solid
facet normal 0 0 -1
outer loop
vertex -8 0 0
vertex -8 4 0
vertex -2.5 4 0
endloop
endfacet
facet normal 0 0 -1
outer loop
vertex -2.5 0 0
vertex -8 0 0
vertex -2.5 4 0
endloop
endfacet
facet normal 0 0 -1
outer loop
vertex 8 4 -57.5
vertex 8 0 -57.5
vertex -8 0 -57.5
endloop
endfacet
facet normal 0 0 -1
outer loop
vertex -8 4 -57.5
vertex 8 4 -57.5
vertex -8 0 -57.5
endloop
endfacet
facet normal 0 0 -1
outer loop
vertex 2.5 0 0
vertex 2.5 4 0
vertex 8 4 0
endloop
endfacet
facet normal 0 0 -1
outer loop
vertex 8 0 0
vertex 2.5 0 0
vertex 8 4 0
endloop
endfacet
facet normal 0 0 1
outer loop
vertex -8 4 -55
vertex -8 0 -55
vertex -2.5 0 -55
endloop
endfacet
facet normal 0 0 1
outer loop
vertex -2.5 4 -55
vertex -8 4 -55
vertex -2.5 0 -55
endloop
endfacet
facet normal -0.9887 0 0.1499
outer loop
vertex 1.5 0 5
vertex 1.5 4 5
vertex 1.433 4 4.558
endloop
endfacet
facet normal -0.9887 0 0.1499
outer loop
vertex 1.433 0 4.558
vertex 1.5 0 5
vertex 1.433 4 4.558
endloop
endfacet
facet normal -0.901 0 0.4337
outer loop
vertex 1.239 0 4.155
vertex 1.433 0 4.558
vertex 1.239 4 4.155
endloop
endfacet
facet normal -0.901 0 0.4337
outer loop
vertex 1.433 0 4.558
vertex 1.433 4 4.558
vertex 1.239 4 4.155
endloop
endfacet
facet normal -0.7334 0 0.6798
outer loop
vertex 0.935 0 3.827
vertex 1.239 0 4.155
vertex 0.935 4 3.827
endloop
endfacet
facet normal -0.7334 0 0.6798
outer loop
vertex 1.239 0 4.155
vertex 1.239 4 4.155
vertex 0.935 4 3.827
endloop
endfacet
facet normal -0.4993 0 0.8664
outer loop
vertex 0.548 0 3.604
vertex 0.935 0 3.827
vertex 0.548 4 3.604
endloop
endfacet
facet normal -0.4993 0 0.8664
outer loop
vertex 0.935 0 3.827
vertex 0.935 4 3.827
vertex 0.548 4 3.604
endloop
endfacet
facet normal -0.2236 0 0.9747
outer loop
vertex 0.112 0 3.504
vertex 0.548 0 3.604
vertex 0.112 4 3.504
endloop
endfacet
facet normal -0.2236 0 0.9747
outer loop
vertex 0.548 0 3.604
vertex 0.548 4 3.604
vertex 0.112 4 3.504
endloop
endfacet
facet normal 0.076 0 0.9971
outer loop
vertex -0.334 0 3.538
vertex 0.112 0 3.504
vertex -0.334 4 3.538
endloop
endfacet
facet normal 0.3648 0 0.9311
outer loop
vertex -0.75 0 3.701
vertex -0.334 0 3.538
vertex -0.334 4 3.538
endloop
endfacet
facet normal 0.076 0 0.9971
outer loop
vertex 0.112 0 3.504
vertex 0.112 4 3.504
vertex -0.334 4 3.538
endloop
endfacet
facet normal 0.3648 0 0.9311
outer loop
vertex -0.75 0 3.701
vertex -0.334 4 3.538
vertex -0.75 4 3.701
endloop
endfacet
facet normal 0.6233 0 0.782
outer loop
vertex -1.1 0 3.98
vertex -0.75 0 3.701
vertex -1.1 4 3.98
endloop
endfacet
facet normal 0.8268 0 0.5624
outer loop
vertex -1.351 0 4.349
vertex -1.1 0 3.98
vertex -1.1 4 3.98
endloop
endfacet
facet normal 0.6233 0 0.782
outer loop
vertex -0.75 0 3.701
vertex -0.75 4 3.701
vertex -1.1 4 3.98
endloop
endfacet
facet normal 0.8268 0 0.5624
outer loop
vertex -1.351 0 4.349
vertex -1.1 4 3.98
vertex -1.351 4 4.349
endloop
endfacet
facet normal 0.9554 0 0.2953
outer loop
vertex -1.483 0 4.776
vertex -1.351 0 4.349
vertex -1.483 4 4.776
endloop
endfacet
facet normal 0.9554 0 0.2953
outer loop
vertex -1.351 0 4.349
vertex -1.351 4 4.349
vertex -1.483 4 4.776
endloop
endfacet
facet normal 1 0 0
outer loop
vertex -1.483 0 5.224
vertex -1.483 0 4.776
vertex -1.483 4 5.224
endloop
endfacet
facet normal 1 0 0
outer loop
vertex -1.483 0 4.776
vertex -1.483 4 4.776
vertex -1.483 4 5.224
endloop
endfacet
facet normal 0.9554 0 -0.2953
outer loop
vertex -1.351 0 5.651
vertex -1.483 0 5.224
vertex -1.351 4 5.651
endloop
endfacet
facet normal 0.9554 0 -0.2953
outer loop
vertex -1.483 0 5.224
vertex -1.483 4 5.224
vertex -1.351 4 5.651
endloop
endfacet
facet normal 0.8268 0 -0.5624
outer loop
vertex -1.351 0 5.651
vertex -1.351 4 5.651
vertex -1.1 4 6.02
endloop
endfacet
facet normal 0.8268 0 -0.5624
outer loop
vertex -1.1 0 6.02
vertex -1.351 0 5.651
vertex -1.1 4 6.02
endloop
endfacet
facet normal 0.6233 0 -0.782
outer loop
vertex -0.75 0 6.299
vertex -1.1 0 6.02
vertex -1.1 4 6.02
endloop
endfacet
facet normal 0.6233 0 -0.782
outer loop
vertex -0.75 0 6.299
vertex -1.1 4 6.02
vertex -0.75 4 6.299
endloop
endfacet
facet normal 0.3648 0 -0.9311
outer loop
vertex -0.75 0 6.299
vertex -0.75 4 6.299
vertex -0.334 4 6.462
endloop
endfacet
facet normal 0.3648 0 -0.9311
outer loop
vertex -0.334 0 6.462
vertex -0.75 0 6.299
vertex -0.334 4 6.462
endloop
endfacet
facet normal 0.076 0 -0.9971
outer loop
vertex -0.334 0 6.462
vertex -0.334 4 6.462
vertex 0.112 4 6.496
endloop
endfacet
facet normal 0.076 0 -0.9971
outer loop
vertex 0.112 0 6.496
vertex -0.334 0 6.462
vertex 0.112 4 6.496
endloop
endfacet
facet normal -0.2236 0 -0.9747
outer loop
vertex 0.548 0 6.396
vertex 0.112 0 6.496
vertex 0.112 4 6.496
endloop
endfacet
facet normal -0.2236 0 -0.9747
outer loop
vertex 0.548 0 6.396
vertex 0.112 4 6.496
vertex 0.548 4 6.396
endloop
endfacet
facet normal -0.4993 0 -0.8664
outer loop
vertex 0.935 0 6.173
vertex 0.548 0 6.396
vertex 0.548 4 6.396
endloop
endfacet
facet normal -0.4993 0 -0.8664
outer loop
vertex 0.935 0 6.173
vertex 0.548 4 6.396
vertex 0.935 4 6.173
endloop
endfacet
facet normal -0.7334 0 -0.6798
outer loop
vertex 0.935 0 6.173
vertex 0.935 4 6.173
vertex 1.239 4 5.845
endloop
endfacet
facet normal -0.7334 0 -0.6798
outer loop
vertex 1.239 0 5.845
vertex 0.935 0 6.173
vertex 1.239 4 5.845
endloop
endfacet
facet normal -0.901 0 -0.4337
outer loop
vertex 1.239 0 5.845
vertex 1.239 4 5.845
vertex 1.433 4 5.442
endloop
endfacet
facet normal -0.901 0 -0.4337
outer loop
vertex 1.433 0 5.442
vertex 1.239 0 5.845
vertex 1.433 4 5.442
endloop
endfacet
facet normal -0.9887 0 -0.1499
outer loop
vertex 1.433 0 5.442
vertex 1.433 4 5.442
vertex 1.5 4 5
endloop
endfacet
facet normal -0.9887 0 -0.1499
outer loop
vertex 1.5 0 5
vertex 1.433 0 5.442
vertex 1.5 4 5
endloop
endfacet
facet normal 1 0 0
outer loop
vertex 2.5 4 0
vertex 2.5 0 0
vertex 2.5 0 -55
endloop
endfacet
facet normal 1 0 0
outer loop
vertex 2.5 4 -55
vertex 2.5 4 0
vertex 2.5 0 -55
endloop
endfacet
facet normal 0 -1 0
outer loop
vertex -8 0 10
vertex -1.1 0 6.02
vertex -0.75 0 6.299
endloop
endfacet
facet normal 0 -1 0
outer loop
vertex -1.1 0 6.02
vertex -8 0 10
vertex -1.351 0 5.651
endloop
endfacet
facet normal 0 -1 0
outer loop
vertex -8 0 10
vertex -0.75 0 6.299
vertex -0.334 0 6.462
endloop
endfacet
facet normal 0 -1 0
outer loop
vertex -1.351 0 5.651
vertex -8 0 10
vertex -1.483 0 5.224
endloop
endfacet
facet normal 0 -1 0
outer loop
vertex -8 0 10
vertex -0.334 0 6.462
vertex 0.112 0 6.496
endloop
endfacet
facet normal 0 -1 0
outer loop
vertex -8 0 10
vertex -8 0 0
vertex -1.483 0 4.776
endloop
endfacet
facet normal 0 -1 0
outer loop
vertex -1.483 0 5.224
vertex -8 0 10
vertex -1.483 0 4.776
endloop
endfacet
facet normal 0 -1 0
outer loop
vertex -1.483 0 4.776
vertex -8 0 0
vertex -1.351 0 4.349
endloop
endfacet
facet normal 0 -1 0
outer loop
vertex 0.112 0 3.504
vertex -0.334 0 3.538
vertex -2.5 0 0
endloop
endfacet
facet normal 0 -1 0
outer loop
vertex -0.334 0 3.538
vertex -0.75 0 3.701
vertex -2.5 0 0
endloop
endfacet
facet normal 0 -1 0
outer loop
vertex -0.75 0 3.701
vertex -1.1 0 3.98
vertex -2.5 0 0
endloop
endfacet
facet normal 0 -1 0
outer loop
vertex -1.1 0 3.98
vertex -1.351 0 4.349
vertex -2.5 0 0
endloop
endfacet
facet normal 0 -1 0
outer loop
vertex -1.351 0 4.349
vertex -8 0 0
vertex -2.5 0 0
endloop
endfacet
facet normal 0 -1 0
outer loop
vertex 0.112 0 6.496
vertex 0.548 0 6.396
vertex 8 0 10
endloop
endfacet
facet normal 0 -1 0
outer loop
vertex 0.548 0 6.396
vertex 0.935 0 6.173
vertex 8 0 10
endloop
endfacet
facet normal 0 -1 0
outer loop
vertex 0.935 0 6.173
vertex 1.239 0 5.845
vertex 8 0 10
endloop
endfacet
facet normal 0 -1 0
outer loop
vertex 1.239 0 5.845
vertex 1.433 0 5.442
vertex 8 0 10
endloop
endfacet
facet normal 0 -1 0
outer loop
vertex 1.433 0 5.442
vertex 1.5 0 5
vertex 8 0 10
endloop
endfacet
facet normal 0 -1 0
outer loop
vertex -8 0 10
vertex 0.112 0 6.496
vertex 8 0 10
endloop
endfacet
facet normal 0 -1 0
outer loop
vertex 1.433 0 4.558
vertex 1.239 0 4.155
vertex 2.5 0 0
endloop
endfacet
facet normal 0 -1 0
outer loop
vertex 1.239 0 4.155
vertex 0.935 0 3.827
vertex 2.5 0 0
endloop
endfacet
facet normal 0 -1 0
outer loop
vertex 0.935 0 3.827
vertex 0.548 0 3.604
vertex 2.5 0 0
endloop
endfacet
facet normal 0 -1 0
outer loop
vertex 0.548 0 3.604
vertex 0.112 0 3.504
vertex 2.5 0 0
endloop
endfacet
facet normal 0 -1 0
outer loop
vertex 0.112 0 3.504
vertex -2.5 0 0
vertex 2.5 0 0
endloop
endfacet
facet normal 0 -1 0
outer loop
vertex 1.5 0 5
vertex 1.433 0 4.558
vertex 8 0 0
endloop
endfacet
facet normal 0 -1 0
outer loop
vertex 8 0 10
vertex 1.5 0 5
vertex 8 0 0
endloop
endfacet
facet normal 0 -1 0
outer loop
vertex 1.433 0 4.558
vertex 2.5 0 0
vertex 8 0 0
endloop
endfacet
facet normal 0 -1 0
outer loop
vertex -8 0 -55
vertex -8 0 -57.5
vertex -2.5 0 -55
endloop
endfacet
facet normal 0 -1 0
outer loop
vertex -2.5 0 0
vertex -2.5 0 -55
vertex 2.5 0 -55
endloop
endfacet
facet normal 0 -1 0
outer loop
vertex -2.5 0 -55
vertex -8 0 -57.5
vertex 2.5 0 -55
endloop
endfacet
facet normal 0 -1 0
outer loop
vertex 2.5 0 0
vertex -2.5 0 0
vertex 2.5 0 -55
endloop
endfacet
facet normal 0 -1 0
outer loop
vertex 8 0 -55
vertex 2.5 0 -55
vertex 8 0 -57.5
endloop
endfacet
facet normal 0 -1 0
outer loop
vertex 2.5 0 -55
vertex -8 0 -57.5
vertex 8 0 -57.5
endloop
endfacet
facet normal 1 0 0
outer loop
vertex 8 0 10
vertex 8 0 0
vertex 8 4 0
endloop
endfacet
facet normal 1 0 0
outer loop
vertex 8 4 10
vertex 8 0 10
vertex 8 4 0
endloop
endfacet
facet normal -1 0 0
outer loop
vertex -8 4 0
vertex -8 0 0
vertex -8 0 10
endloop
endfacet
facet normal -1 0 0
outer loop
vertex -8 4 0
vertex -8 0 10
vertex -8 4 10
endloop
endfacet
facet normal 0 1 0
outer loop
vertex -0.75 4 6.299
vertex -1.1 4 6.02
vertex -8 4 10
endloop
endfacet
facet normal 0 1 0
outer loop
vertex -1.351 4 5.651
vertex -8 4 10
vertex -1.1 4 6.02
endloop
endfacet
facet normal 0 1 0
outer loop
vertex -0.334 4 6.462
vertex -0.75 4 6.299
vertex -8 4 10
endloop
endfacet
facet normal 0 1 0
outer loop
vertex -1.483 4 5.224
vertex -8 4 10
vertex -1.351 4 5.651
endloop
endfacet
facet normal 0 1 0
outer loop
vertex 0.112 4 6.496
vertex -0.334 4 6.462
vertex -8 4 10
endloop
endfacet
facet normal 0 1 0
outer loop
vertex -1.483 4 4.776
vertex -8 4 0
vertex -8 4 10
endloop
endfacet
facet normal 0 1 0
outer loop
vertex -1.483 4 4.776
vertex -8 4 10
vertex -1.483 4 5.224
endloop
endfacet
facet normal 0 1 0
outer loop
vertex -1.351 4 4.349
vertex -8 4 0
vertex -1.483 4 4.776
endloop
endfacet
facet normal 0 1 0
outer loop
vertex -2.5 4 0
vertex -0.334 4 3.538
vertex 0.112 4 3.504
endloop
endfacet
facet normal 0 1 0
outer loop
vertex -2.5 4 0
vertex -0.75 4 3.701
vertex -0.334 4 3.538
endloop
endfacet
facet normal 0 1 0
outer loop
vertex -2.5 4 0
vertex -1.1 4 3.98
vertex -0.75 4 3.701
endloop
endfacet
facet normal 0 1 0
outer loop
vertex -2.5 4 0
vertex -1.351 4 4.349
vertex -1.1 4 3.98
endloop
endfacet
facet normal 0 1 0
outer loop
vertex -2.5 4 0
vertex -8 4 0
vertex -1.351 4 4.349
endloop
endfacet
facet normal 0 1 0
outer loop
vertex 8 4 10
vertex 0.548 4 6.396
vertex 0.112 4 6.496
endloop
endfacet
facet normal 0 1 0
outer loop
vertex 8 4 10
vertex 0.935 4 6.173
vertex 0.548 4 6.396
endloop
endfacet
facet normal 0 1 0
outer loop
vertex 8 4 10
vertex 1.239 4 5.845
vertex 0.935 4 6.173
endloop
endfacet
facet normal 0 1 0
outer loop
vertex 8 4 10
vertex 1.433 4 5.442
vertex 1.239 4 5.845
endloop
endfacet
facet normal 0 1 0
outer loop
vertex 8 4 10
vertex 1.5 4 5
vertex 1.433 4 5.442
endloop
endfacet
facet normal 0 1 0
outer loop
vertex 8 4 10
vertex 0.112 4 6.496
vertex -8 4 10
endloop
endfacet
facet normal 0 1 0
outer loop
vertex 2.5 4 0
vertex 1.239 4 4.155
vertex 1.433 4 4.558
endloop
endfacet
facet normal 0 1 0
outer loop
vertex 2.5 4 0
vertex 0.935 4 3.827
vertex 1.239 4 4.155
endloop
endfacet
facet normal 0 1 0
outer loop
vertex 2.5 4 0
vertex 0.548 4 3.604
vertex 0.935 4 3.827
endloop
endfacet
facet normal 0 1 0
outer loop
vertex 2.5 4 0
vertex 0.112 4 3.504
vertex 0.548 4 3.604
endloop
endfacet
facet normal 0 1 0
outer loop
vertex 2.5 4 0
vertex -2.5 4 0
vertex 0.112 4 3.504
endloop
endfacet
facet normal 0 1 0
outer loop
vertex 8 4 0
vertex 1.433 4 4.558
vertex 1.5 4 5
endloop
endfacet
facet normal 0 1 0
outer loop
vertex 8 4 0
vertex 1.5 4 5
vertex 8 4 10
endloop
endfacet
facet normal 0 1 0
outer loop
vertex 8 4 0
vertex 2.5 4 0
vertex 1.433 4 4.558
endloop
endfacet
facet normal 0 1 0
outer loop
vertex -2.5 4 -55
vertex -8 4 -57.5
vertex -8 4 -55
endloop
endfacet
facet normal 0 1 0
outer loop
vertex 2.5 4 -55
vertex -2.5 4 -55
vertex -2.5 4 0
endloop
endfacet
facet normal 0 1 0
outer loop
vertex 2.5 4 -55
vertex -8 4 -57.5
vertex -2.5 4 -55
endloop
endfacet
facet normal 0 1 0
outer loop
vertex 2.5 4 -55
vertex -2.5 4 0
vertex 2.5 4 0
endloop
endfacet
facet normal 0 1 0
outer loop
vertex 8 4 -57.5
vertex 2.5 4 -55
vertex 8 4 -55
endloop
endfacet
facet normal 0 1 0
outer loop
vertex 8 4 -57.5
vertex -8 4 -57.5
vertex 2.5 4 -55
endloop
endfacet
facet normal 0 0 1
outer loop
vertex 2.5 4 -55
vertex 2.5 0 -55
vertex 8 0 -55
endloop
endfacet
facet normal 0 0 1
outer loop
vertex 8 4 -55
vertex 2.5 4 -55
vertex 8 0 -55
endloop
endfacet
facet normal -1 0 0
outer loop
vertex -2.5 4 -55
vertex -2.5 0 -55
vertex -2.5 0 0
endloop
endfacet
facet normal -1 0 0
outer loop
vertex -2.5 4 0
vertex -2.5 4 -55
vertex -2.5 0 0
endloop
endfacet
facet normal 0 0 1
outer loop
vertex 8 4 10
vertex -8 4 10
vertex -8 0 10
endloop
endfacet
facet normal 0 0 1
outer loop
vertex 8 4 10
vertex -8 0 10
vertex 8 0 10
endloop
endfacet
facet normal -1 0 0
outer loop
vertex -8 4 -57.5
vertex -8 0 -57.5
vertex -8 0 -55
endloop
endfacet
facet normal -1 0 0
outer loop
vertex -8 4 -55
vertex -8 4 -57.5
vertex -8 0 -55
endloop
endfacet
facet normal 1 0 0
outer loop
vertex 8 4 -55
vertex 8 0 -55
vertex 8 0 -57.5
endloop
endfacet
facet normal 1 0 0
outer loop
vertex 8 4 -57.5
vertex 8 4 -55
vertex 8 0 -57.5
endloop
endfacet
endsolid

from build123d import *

# Parameters (mm, degrees)
BOSS_EXTRUDE1_DEPTH = 4
SKETCH2_W           = 16
SKETCH2_H           = 4
BOSS_EXTRUDE2_DEPTH = 10
SKETCH3_R           = 1.5
CUT_EXTRUDE1_DEPTH  = 10


with BuildPart() as part:
    # Sketch1 → Boss-Extrude1 (new body)
    with BuildSketch(Plane(origin=(0, 0, 0), x_dir=(1, 0, 0), z_dir=(0, 1, 0))):
        Polygon((8, 57.5), (-8, 57.5), (-8, 55), (-2.5, 55), (-2.5, 0), (2.5, 0), (2.5, 55), (8, 55), align=None)
    extrude(amount=BOSS_EXTRUDE1_DEPTH)

    # Sketch2 → Boss-Extrude2 (add)
    with BuildSketch(Plane.XY):
        with Locations((0, 2)):
            Rectangle(SKETCH2_W, SKETCH2_H)
    extrude(amount=BOSS_EXTRUDE2_DEPTH)

    # Sketch3 → Cut-Extrude1 (cut)
    with BuildSketch(Plane(origin=(0, 4, 0), x_dir=(1, 0, 0), z_dir=(0, 1, 0))):
        with Locations((0, -5)):
            Circle(SKETCH3_R)
    extrude(amount=-CUT_EXTRUDE1_DEPTH, mode=Mode.SUBTRACT)


solid = part.part
